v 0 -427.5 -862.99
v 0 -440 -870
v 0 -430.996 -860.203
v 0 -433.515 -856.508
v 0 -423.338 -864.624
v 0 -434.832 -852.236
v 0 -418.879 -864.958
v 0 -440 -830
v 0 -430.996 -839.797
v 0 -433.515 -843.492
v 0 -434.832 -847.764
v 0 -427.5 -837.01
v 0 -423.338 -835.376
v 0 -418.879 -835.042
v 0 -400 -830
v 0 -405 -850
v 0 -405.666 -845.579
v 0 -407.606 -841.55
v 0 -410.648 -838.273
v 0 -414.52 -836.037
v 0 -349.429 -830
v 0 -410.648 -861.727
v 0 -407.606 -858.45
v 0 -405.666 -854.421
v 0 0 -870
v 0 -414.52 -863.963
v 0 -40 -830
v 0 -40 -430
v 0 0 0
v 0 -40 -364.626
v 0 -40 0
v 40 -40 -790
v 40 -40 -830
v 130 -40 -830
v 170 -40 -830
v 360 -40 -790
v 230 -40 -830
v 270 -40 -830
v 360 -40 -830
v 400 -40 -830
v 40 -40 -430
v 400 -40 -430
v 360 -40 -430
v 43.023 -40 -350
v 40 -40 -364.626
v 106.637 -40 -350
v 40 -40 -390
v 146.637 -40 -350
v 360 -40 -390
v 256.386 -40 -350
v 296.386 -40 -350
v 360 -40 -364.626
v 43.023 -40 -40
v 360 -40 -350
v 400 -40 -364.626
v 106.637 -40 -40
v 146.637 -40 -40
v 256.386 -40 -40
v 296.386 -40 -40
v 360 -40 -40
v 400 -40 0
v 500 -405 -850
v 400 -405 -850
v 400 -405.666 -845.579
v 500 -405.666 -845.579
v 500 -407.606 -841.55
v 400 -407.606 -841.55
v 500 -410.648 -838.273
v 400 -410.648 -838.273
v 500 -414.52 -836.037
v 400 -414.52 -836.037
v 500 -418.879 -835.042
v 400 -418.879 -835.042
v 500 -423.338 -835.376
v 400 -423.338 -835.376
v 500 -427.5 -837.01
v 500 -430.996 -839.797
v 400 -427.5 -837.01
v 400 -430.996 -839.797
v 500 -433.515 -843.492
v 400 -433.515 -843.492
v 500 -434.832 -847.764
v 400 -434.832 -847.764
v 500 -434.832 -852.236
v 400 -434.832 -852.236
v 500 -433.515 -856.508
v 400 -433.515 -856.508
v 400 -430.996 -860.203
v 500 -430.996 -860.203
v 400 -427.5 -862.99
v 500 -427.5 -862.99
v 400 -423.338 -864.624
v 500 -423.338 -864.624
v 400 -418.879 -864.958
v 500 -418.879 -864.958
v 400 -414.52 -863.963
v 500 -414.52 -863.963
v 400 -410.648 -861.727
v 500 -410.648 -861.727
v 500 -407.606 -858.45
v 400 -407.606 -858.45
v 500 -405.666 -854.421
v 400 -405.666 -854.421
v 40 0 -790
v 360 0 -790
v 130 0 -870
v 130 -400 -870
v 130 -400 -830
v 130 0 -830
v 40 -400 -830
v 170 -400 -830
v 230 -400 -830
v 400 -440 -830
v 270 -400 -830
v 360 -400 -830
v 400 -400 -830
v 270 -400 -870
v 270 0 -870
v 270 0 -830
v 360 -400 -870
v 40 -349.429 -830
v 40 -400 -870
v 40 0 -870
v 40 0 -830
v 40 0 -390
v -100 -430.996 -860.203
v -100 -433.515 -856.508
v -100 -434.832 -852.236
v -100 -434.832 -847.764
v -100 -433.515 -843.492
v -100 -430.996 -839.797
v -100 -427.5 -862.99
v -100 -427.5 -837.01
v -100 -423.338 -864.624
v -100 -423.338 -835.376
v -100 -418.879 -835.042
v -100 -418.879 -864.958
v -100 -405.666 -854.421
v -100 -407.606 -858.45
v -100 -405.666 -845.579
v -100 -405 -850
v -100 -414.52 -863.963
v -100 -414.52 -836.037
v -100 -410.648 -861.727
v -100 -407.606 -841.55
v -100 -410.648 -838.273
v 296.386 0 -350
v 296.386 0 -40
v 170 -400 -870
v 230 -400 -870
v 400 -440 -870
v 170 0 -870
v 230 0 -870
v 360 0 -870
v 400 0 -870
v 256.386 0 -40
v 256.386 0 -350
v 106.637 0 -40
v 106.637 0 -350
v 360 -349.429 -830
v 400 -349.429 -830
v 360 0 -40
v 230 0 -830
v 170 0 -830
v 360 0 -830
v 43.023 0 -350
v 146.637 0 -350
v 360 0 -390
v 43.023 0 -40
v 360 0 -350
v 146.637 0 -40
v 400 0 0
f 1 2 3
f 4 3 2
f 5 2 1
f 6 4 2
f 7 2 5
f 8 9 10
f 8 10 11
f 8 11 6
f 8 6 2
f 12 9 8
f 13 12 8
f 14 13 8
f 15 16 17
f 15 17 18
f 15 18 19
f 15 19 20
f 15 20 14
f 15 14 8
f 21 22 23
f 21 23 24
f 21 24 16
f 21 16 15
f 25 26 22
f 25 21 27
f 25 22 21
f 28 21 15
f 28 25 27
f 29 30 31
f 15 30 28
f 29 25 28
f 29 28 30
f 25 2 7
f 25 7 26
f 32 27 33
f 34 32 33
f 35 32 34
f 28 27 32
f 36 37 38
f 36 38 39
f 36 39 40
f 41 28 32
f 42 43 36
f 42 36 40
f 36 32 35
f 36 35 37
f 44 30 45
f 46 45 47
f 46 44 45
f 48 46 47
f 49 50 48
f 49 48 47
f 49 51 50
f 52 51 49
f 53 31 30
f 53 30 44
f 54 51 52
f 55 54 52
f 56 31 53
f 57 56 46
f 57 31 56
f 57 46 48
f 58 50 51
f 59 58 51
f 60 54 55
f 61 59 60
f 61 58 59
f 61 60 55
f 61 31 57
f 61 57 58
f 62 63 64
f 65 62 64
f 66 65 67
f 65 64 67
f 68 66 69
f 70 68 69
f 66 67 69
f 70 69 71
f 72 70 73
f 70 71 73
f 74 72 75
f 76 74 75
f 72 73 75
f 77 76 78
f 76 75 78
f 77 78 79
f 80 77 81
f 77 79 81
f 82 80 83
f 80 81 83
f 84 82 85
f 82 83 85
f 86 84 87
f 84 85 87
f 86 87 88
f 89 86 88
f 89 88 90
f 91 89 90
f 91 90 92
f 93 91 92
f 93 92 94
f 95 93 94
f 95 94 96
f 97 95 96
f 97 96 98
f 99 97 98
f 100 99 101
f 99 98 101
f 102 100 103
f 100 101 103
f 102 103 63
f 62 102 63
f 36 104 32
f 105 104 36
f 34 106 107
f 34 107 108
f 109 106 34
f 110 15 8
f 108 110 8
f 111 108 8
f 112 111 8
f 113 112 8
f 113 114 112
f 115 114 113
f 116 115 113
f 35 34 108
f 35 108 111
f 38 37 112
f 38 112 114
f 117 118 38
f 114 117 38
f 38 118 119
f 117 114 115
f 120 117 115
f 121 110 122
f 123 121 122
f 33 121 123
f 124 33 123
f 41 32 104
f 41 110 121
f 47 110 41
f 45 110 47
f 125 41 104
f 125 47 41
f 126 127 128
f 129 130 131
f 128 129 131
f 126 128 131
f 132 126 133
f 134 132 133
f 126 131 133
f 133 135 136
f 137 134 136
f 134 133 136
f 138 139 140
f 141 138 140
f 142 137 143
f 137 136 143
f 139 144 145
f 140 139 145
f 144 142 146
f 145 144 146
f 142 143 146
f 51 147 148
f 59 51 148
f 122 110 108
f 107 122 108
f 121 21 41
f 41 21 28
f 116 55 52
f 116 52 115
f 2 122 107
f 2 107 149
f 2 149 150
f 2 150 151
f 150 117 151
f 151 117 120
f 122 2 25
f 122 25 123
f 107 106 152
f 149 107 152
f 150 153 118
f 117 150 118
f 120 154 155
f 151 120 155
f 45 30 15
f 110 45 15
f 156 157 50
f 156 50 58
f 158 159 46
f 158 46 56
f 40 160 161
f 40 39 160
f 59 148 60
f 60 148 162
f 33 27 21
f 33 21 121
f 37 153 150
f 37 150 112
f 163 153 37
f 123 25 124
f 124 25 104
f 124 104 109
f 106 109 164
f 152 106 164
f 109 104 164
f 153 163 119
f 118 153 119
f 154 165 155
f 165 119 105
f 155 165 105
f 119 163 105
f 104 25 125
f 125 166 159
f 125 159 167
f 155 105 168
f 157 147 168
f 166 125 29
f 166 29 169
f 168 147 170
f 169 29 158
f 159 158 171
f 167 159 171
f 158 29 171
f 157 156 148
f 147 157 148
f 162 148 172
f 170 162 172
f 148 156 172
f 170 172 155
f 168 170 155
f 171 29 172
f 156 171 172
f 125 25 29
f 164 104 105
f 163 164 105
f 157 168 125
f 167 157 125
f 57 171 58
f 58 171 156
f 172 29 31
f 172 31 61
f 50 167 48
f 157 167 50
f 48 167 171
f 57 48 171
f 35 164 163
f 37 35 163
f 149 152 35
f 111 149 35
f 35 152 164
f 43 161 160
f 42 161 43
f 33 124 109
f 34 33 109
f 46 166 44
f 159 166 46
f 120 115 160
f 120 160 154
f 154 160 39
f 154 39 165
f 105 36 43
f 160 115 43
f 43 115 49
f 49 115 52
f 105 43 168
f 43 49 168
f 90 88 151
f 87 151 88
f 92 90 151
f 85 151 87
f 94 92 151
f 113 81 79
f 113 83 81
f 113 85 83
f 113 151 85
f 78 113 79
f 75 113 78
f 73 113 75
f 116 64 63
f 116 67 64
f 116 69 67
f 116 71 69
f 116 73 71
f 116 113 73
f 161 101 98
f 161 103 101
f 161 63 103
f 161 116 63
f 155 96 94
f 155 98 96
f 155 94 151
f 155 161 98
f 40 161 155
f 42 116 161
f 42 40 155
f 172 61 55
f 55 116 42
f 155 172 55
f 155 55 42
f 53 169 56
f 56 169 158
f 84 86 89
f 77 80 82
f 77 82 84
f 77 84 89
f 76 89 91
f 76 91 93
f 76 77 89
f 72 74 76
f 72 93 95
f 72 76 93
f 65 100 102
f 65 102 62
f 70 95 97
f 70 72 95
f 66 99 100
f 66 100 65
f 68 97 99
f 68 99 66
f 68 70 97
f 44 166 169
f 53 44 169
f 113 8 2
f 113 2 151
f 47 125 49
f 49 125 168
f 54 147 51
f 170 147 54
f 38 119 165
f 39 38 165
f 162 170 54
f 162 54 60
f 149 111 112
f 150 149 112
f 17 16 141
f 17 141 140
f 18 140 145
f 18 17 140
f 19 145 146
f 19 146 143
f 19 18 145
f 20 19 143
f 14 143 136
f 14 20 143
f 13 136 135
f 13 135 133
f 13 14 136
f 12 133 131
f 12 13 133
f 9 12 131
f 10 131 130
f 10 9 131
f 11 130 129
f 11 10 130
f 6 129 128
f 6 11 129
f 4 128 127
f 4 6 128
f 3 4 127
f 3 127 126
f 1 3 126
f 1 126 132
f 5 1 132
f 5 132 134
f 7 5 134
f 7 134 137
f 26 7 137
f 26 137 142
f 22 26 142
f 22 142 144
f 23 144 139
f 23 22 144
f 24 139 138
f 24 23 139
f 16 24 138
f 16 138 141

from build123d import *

# Parameters (mm, degrees)
F0_W      = 400
F0_H      = 830
F0_W_2    = 320
F0_H_2    = 400
F0_W_3    = 63.6140084174
F0_H_3    = 310
F0_W_4    = 109.7493757494
F1_DEPTH  = 40
F2_W      = 40
F2_H      = 40
F3_DEPTH  = 400
F5_DEPTH  = 40
F7_W      = 400
F7_H      = 40
F8_DEPTH  = 40
F11_DEPTH = 40
F12_R     = 15
F13_DEPTH = 100
F14_R     = 15
F15_DEPTH = 100


with BuildPart() as f1:
    # F0 (on Front) → F1 (new body)
    with BuildSketch(Plane.XZ):
        with Locations((200, -415)):
            Rectangle(F0_W, F0_H)
        with Locations((200, -590)):
            Rectangle(F0_W_2, F0_H_2, mode=Mode.SUBTRACT)
        with Locations((74.8296116246, -195)):
            Rectangle(F0_W_3, F0_H_3, mode=Mode.SUBTRACT)
        with Locations((201.511303708, -195)):
            Rectangle(F0_W_4, F0_H_3, mode=Mode.SUBTRACT)
        with Locations((328.1929957913, -195)):
            Rectangle(F0_W_3, F0_H_3, mode=Mode.SUBTRACT)
    extrude(amount=F1_DEPTH)

    # F2 (on Front) → F3 (join)
    with BuildSketch(Plane.XZ):
        with Locations((380, -850)):
            Rectangle(F2_W, F2_H)
        with Locations((250, -850)):
            Rectangle(F2_W, F2_H)
        with Locations((150, -850)):
            Rectangle(F2_W, F2_H)
        with Locations((20, -850)):
            Rectangle(F2_W, F2_H)
    extrude(amount=F3_DEPTH)

    # F4 (on Right) → F5 (join)
    with BuildSketch(Plane.YZ):
        Polygon((-40, -430), (-40, -364.6261646075), (-400, -830), (-349.4286550909, -830), align=None)
    extrude(amount=F5_DEPTH)

    # F7 (on offset) → F8 (join)
    with BuildSketch(Plane.XZ.offset(400)):
        with Locations((200, -850)):
            Rectangle(F7_W, F7_H)
    extrude(amount=F8_DEPTH)

    # F10 (on offset) → F11 (join)
    with BuildSketch(Plane.YZ.offset(400)):
        Polygon((-400, -830), (-349.4286550909, -830), (-40, -430), (-40, -364.6261646075), align=None)
    extrude(amount=-F11_DEPTH)

    # F12 (on offset) → F13 (join)
    with BuildSketch(Plane.YZ.offset(400)):
        with Locations((-420, -850)):
            Circle(F12_R)
    extrude(amount=F13_DEPTH)

    # F14 (on Right) → F15 (join)
    with BuildSketch(Plane.YZ):
        with Locations((-420, -850)):
            Circle(F14_R)
    extrude(amount=-F15_DEPTH)


solid = f1.part
